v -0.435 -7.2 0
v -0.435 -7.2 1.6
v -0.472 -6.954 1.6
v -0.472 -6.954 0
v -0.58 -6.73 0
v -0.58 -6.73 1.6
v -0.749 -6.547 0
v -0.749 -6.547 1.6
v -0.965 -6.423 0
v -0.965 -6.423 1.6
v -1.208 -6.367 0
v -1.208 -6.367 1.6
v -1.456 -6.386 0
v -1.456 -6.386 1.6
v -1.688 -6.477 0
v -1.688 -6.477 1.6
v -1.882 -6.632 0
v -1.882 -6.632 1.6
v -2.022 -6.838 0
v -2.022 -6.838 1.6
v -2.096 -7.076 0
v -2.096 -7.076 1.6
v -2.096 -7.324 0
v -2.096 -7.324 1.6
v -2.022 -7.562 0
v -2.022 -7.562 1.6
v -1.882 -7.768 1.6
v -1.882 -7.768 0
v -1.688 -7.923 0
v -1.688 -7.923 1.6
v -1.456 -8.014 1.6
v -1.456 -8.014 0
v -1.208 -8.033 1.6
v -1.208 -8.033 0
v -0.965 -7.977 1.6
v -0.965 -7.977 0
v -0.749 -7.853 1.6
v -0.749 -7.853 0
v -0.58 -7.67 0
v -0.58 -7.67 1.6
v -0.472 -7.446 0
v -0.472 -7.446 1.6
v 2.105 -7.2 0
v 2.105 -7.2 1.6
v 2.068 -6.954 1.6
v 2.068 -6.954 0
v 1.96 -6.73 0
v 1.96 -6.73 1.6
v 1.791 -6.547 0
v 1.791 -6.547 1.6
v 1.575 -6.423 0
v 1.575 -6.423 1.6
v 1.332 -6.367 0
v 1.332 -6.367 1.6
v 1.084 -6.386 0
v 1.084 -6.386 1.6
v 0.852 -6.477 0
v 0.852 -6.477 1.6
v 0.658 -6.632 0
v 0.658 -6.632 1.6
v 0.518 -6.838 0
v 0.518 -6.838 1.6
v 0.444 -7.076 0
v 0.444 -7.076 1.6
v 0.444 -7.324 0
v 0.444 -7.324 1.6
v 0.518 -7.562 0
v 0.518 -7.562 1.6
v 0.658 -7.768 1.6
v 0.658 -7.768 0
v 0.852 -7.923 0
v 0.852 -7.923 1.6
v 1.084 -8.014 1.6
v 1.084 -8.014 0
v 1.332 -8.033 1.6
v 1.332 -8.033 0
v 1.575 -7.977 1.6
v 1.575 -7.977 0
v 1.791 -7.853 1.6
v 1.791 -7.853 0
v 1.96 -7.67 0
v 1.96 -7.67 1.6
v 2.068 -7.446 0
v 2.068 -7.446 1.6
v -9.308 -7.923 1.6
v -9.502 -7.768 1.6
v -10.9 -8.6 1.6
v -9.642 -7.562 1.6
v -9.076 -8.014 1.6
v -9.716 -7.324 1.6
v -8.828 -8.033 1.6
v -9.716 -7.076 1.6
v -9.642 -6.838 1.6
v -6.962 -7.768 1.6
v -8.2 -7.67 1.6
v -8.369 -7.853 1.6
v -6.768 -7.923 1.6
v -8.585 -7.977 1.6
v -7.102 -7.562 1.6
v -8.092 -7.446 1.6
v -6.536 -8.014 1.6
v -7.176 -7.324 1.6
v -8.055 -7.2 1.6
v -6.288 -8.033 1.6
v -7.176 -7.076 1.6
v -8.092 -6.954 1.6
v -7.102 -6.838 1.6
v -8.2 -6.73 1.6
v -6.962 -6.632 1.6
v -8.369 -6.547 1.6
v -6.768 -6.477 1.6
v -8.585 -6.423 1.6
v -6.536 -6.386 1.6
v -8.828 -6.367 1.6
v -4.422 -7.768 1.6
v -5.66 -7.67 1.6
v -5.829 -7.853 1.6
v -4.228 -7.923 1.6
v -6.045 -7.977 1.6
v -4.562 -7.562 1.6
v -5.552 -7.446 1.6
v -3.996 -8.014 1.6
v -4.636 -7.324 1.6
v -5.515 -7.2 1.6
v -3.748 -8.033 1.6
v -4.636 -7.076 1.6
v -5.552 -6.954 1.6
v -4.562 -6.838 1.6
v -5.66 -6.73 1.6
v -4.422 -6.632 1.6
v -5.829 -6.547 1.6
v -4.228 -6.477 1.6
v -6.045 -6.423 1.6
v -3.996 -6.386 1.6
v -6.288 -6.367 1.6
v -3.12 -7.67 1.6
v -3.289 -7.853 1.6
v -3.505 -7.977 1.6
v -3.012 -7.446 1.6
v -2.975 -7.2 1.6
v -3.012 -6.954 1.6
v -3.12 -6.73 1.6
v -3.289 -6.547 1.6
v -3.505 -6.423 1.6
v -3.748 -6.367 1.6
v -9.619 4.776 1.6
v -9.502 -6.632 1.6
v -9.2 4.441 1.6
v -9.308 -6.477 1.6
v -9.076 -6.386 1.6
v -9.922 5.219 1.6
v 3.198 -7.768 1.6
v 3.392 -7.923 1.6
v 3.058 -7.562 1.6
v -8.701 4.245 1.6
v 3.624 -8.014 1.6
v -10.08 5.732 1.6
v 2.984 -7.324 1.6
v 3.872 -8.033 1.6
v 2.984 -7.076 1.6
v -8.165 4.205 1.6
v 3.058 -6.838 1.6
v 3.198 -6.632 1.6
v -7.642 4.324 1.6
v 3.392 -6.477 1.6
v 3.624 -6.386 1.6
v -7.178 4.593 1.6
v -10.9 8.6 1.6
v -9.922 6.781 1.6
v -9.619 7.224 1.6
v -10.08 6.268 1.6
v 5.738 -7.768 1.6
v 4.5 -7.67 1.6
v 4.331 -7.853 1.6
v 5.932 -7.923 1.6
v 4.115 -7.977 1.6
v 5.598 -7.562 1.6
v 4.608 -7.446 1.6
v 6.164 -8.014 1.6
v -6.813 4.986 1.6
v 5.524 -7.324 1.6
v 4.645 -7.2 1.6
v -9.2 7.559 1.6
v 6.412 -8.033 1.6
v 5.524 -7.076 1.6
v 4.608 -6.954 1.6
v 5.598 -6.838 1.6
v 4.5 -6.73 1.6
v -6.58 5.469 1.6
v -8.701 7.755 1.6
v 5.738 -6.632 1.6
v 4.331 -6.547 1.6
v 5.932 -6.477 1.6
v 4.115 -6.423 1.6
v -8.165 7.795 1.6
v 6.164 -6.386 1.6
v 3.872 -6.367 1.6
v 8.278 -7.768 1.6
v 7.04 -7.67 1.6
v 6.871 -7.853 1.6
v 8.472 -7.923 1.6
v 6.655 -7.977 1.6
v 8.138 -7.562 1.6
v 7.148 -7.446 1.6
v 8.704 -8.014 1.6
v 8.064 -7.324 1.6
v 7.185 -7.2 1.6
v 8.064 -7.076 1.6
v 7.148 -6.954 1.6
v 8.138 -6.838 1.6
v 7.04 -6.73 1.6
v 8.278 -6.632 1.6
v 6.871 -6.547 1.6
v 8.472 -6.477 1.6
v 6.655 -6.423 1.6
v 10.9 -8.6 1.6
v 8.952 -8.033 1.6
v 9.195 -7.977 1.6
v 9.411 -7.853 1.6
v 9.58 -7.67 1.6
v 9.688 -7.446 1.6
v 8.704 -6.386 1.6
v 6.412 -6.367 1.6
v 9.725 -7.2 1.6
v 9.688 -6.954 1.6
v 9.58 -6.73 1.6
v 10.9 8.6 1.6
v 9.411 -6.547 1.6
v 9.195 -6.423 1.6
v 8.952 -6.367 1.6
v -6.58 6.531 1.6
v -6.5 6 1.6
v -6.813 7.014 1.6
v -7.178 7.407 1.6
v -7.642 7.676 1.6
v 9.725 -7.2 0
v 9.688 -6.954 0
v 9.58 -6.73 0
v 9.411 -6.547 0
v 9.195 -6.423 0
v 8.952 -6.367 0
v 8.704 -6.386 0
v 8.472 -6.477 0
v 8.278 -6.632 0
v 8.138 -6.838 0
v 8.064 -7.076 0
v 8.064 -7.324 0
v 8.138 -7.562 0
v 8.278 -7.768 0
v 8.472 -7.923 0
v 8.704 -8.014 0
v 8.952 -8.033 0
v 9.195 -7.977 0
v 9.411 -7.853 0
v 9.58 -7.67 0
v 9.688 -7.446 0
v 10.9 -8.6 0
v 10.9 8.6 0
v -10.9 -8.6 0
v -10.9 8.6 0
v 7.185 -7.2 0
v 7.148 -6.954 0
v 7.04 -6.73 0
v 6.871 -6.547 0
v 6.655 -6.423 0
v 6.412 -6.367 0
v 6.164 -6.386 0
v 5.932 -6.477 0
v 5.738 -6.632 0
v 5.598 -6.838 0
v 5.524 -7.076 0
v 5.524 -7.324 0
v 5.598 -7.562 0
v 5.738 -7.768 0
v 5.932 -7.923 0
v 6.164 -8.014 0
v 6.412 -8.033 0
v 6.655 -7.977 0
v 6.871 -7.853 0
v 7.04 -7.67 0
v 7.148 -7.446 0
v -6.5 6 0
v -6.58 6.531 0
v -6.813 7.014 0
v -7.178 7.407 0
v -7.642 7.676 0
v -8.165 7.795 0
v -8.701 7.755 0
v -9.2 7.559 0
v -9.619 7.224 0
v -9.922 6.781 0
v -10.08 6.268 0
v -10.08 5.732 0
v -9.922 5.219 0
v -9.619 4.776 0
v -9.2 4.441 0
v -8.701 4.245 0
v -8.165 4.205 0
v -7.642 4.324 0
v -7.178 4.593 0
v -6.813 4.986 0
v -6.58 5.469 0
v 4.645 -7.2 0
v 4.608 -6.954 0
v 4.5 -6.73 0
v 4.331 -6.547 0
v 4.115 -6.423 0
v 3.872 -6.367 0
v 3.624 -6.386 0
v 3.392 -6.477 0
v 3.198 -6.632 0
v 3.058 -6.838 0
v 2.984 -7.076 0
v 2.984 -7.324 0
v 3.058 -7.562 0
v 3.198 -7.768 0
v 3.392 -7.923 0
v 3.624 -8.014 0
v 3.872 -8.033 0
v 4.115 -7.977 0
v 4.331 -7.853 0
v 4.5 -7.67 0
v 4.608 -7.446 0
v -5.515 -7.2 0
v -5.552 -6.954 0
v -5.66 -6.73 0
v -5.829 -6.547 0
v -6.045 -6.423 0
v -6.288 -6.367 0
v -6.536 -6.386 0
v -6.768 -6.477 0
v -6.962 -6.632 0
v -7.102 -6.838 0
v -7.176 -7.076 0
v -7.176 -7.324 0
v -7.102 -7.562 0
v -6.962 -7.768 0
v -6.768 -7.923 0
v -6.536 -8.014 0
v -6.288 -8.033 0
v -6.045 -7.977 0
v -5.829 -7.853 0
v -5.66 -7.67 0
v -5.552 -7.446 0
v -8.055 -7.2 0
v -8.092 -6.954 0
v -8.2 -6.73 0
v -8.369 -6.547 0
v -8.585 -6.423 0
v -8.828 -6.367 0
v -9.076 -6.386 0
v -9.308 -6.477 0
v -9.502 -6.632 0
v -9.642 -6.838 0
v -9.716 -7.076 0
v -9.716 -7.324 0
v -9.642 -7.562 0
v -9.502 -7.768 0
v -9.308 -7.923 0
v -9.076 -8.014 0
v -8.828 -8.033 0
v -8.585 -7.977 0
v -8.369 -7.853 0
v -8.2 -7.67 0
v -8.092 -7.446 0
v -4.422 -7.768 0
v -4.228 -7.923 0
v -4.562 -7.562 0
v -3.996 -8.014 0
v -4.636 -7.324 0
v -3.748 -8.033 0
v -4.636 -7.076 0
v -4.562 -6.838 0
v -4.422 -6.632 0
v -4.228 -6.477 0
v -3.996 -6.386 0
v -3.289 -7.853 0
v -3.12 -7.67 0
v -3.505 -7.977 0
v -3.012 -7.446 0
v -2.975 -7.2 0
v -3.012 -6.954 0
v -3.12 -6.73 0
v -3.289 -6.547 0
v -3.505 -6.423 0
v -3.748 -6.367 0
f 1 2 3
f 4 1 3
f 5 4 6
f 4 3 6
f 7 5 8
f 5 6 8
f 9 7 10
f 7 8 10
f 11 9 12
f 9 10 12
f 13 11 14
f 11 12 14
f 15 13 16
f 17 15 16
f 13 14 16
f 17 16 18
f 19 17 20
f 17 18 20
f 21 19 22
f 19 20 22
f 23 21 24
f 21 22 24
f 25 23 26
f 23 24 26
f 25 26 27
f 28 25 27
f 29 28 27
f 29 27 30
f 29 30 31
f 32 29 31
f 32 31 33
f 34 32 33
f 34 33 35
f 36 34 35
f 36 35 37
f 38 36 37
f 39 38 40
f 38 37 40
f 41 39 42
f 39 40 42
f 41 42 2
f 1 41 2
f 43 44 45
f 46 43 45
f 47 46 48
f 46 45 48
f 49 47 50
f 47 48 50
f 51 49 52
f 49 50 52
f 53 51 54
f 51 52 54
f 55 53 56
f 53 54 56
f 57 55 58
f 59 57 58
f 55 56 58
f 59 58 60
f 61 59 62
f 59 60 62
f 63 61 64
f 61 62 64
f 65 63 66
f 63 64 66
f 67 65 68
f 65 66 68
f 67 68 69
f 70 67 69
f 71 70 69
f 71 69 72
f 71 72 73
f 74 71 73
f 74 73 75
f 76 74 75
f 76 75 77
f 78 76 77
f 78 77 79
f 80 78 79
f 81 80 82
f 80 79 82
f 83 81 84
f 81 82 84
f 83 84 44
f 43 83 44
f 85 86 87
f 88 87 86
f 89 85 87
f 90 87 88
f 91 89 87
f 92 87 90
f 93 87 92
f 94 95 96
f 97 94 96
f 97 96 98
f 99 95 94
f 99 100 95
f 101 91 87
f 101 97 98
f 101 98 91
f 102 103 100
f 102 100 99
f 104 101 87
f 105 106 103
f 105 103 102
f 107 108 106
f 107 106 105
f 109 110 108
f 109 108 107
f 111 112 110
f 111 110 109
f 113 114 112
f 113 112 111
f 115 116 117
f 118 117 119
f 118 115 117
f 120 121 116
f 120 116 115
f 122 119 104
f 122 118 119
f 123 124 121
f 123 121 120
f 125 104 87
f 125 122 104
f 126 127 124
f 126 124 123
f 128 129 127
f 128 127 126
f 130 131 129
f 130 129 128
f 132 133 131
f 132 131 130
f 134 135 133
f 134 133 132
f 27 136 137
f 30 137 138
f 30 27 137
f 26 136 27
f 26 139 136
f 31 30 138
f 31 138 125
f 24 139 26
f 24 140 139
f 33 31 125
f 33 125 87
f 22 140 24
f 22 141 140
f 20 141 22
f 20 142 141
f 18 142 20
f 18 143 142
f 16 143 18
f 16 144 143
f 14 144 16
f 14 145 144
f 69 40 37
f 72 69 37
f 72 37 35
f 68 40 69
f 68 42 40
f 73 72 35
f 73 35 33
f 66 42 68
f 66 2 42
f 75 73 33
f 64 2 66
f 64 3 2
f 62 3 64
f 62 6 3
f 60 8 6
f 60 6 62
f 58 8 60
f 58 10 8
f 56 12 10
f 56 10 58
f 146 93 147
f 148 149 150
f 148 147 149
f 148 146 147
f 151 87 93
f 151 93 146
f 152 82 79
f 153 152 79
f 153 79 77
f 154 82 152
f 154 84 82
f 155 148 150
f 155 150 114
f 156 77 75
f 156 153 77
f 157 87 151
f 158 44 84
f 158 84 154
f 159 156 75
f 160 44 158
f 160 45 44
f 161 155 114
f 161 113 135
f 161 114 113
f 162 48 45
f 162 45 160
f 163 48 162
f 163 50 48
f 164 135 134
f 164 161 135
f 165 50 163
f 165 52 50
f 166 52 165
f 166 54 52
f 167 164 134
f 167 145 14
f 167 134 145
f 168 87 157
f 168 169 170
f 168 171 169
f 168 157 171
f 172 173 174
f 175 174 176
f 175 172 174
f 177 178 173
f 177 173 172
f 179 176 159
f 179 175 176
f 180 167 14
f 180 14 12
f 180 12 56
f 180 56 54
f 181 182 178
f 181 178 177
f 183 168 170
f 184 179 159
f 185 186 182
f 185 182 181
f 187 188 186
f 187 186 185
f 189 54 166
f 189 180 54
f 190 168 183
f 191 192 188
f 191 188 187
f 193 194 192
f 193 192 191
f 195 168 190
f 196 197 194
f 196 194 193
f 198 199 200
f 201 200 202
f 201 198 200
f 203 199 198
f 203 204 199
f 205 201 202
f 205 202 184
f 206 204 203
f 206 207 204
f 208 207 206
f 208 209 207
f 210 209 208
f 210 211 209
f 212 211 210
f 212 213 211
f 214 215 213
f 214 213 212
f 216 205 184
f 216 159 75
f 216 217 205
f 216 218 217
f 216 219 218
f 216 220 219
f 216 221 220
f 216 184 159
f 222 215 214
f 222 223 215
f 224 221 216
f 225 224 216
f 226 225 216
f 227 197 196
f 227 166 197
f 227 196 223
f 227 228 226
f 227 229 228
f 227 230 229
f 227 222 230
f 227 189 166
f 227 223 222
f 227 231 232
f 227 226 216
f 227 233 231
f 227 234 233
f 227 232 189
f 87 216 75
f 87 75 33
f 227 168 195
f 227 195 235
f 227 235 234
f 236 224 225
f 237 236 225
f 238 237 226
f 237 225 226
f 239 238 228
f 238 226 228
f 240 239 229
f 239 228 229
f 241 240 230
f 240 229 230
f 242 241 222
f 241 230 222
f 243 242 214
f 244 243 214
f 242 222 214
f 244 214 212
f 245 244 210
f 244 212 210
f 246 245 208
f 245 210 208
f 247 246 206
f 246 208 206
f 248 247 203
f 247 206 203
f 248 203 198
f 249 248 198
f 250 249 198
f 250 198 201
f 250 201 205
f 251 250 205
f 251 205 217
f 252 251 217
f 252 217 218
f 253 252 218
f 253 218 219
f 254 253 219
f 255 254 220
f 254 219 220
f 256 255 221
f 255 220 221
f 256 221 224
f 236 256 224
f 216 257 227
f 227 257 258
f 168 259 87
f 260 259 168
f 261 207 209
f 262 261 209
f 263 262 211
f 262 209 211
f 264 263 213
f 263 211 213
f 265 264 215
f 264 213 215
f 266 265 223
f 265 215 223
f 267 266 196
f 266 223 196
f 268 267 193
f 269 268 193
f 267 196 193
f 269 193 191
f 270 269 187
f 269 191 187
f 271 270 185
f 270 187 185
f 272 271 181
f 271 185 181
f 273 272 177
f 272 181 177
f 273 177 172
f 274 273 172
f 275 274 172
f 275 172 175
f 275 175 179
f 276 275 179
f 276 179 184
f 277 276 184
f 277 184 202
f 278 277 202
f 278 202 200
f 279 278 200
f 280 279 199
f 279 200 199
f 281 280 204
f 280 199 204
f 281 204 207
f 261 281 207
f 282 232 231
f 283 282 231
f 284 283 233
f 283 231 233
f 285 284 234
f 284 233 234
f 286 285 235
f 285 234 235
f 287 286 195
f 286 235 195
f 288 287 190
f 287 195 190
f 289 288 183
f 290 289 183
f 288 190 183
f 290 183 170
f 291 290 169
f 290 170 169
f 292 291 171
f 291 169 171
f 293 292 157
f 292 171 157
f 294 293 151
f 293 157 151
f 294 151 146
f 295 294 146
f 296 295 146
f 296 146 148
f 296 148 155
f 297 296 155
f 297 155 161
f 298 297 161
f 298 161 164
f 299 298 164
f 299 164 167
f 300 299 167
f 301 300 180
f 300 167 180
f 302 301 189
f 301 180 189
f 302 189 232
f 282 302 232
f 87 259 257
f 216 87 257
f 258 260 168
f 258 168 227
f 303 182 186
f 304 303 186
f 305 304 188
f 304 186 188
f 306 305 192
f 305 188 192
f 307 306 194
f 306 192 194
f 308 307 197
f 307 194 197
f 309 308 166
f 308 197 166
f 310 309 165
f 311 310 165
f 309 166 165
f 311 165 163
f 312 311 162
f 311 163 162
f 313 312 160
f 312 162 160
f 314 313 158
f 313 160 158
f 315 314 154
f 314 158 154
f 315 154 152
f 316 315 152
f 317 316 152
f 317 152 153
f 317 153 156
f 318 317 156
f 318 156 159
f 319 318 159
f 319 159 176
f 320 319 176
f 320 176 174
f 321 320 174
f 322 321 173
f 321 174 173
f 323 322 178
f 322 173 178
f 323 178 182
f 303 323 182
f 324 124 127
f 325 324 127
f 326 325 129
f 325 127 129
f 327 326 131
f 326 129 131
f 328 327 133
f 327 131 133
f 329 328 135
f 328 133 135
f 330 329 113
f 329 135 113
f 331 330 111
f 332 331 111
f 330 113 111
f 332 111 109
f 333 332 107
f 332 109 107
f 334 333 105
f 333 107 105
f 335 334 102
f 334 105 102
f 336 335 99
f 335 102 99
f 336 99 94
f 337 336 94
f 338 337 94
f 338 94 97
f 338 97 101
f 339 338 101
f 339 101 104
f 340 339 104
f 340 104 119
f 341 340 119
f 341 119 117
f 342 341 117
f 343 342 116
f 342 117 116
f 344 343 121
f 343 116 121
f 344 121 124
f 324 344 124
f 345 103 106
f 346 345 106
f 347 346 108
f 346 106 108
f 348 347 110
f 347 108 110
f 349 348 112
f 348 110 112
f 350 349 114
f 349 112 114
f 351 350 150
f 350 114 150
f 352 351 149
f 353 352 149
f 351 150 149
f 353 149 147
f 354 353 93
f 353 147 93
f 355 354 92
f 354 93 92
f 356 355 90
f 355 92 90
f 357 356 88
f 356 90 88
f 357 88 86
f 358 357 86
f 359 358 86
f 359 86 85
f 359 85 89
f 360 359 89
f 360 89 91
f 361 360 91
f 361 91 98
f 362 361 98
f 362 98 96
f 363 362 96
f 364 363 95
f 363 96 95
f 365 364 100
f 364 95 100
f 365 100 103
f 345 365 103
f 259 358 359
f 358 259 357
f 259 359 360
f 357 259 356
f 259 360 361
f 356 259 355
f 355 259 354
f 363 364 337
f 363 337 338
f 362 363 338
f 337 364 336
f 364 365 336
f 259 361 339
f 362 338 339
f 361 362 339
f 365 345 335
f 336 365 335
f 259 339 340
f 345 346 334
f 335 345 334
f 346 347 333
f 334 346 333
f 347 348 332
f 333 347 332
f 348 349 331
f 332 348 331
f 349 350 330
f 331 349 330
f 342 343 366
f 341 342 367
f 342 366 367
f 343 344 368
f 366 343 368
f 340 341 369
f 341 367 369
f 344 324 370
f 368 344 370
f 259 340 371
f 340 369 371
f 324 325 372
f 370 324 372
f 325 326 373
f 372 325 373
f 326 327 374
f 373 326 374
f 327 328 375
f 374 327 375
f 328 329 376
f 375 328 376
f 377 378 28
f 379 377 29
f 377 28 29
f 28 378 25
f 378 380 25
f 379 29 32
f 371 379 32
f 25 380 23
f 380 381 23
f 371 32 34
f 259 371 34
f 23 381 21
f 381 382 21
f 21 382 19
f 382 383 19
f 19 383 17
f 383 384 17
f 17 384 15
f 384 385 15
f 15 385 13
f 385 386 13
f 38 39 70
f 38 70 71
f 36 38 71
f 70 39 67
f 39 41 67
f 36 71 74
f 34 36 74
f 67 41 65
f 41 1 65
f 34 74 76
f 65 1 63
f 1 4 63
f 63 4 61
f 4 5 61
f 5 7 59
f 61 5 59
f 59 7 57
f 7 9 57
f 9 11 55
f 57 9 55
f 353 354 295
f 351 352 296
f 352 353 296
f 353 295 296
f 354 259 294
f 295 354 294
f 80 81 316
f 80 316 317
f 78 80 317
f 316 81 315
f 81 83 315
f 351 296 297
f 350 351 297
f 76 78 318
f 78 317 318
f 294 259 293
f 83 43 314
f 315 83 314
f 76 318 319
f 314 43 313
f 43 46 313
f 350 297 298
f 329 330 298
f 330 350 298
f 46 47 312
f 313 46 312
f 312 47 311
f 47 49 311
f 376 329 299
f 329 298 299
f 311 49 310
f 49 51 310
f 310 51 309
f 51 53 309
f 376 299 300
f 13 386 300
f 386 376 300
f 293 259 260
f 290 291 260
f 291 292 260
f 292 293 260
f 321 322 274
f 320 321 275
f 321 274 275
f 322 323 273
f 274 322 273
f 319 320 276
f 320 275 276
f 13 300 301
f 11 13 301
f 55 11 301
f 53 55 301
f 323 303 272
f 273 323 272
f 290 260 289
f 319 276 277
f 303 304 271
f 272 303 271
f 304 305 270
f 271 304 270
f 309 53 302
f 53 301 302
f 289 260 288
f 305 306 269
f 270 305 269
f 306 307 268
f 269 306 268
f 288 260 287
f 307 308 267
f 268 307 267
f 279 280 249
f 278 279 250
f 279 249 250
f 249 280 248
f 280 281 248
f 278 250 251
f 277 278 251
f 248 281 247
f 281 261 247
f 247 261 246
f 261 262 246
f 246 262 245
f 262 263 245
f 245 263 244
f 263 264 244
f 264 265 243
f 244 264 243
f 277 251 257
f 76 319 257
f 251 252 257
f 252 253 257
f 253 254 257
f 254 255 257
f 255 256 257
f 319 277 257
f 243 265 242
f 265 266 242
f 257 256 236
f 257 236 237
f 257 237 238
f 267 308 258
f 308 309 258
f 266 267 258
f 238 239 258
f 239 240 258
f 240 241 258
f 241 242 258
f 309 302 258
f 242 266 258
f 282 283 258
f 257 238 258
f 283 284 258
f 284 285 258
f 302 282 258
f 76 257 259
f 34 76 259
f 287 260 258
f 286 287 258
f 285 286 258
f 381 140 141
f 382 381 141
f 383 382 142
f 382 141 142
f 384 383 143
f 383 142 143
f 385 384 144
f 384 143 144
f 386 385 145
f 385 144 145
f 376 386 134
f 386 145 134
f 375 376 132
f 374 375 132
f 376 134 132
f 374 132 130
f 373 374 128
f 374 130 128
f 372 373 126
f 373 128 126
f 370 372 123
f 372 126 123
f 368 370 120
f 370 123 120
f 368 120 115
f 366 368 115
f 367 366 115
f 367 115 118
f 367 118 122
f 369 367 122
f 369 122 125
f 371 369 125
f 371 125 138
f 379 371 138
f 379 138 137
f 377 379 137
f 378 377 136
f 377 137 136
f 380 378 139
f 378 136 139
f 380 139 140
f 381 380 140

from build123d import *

# Parameters (mm, degrees)
SKETCH1_W           = 21.8
SKETCH1_H           = 17.2
BOSS_EXTRUDE1_DEPTH = 1.6
SKETCH2_R           = 0.835
SKETCH2_R_2         = 1.8
CUT_EXTRUDE1_DEPTH  = 1.6


with BuildPart() as part:
    # Sketch1 → Boss-Extrude1 (new body)
    with BuildSketch(Plane.XY):
        Rectangle(SKETCH1_W, SKETCH1_H)
    extrude(amount=BOSS_EXTRUDE1_DEPTH)

    # Sketch2 → Cut-Extrude1 (cut)
    with BuildSketch(Plane.XY.offset(1.6)):
        with Locations((8.89, -7.2)):
            Circle(SKETCH2_R)
        with Locations((6.35, -7.2)):
            Circle(SKETCH2_R)
        with Locations((3.81, -7.2)):
            Circle(SKETCH2_R)
        with Locations((1.27, -7.2)):
            Circle(SKETCH2_R)
        with Locations((-1.27, -7.2)):
            Circle(SKETCH2_R)
        with Locations((-3.81, -7.2)):
            Circle(SKETCH2_R)
        with Locations((-6.35, -7.2)):
            Circle(SKETCH2_R)
        with Locations((-8.89, -7.2)):
            Circle(SKETCH2_R)
        with Locations((-8.3, 6)):
            Circle(SKETCH2_R_2)
    extrude(amount=-CUT_EXTRUDE1_DEPTH, mode=Mode.SUBTRACT)


solid = part.part
